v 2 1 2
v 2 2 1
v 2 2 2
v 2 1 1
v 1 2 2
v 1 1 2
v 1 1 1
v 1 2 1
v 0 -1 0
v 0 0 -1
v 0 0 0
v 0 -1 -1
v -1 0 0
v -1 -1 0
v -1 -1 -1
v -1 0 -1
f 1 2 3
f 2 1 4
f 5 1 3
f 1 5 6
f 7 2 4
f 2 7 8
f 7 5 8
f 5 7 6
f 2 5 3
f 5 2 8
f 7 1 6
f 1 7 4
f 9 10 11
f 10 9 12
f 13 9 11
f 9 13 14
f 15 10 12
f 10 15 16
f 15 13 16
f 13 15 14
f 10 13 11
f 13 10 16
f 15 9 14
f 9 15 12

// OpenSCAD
$fn = 20;

translate ([1,1,1])
cube([1,1,1]);


translate ([-1,-1,-1])
cube([1,1,1]);
